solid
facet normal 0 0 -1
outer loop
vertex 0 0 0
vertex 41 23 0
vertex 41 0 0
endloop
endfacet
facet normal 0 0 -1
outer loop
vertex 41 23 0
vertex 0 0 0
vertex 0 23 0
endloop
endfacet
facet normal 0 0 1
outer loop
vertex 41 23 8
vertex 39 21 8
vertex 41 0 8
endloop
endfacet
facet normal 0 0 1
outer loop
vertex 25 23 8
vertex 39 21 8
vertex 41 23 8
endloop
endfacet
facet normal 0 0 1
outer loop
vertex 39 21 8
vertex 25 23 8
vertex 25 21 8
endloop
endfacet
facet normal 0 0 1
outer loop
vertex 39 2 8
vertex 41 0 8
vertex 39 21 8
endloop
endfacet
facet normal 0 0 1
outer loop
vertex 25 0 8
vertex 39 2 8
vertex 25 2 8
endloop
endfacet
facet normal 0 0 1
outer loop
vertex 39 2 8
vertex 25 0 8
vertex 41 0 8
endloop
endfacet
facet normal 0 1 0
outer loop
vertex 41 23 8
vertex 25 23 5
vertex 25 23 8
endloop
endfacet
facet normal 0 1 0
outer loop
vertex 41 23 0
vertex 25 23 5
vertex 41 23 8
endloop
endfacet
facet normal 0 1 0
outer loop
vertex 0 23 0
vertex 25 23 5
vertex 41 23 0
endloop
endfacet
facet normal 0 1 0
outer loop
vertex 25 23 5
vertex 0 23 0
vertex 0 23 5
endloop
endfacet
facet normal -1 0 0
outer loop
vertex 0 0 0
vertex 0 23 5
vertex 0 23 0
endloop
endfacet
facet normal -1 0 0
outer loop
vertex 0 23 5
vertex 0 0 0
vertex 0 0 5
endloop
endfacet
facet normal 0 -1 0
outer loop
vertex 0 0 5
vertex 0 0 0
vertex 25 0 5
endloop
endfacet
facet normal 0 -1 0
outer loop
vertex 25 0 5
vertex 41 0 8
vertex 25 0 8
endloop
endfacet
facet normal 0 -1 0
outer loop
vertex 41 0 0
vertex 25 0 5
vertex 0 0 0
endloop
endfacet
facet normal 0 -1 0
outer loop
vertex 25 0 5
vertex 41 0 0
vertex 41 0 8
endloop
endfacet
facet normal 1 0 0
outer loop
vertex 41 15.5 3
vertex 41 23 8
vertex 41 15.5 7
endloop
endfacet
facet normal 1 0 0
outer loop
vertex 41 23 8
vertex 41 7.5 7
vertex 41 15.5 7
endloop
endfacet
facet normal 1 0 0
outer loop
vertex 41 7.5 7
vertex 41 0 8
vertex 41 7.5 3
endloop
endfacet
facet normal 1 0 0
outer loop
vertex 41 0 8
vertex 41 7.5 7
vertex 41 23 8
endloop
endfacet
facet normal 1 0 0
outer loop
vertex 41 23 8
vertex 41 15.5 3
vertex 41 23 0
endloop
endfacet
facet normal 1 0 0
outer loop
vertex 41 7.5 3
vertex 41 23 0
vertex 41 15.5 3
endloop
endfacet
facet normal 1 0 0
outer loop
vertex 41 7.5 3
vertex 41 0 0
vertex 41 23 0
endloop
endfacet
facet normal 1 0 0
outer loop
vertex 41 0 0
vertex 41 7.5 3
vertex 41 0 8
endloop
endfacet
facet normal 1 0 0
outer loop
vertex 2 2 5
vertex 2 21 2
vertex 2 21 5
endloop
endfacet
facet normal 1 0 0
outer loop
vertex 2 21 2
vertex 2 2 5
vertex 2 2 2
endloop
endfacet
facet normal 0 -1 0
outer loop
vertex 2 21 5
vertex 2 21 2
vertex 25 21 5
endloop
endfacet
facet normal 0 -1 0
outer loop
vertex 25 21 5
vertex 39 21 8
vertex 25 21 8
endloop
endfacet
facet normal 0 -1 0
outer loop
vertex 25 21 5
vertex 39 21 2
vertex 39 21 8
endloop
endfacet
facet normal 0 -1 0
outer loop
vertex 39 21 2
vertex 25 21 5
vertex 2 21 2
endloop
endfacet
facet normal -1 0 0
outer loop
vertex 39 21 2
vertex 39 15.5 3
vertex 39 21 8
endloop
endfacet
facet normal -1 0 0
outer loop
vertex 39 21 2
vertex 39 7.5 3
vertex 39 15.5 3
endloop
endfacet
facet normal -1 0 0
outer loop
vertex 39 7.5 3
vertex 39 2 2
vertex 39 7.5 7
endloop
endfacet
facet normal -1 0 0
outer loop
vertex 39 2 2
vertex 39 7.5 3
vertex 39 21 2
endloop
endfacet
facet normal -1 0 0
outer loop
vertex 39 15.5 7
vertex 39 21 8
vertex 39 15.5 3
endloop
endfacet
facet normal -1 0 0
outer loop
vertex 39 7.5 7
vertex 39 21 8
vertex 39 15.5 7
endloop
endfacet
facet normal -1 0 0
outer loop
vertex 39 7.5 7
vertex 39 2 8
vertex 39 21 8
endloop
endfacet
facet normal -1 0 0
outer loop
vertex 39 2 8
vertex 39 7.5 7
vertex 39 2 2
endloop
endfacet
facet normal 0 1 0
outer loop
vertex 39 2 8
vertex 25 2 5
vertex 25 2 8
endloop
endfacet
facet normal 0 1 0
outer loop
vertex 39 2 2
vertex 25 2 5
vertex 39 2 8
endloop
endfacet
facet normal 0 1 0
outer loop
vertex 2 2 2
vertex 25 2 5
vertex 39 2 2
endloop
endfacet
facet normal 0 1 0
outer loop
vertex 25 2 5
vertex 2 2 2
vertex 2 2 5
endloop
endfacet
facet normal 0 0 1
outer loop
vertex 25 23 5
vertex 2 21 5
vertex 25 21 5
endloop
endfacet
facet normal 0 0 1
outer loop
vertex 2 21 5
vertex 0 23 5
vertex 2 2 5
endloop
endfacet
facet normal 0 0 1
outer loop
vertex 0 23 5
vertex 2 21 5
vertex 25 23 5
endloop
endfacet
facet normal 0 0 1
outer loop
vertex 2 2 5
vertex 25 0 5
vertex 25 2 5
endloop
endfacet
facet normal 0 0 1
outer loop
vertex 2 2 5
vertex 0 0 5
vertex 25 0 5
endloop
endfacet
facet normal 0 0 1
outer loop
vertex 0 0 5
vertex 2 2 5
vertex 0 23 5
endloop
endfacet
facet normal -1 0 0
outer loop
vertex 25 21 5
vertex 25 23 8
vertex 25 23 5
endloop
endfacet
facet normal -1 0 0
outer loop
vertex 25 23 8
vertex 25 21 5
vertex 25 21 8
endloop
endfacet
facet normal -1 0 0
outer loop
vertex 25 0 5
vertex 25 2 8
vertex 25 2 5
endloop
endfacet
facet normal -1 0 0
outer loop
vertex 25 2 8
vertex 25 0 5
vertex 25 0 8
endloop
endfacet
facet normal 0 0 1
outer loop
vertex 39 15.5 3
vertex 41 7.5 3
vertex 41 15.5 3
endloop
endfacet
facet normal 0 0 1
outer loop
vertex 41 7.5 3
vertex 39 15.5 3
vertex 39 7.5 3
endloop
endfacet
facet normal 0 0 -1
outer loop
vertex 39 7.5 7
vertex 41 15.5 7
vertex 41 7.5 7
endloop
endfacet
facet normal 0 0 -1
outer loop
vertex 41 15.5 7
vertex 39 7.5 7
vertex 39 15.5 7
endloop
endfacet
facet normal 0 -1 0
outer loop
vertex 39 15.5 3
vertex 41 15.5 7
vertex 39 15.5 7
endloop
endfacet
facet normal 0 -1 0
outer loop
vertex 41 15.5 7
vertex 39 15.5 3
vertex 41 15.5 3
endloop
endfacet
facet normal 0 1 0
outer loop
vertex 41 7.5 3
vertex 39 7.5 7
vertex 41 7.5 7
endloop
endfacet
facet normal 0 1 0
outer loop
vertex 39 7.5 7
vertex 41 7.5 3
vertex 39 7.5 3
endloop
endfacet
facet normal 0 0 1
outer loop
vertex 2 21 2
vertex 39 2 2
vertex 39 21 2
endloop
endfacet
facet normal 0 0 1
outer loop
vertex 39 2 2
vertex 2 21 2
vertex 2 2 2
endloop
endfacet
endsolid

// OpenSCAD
    
linear_extrude(2) translate ([2,2]) square([37,19]);

difference () {
difference () {
linear_extrude(8) difference() {  
    
    square([41,23]); translate ([2,2]) square([37,19]);
    }
translate ([0,0,5]) linear_extrude(3) square([25,23]);}

translate ([35,7.5,3]) linear_extrude(4) square([10,8]);}
